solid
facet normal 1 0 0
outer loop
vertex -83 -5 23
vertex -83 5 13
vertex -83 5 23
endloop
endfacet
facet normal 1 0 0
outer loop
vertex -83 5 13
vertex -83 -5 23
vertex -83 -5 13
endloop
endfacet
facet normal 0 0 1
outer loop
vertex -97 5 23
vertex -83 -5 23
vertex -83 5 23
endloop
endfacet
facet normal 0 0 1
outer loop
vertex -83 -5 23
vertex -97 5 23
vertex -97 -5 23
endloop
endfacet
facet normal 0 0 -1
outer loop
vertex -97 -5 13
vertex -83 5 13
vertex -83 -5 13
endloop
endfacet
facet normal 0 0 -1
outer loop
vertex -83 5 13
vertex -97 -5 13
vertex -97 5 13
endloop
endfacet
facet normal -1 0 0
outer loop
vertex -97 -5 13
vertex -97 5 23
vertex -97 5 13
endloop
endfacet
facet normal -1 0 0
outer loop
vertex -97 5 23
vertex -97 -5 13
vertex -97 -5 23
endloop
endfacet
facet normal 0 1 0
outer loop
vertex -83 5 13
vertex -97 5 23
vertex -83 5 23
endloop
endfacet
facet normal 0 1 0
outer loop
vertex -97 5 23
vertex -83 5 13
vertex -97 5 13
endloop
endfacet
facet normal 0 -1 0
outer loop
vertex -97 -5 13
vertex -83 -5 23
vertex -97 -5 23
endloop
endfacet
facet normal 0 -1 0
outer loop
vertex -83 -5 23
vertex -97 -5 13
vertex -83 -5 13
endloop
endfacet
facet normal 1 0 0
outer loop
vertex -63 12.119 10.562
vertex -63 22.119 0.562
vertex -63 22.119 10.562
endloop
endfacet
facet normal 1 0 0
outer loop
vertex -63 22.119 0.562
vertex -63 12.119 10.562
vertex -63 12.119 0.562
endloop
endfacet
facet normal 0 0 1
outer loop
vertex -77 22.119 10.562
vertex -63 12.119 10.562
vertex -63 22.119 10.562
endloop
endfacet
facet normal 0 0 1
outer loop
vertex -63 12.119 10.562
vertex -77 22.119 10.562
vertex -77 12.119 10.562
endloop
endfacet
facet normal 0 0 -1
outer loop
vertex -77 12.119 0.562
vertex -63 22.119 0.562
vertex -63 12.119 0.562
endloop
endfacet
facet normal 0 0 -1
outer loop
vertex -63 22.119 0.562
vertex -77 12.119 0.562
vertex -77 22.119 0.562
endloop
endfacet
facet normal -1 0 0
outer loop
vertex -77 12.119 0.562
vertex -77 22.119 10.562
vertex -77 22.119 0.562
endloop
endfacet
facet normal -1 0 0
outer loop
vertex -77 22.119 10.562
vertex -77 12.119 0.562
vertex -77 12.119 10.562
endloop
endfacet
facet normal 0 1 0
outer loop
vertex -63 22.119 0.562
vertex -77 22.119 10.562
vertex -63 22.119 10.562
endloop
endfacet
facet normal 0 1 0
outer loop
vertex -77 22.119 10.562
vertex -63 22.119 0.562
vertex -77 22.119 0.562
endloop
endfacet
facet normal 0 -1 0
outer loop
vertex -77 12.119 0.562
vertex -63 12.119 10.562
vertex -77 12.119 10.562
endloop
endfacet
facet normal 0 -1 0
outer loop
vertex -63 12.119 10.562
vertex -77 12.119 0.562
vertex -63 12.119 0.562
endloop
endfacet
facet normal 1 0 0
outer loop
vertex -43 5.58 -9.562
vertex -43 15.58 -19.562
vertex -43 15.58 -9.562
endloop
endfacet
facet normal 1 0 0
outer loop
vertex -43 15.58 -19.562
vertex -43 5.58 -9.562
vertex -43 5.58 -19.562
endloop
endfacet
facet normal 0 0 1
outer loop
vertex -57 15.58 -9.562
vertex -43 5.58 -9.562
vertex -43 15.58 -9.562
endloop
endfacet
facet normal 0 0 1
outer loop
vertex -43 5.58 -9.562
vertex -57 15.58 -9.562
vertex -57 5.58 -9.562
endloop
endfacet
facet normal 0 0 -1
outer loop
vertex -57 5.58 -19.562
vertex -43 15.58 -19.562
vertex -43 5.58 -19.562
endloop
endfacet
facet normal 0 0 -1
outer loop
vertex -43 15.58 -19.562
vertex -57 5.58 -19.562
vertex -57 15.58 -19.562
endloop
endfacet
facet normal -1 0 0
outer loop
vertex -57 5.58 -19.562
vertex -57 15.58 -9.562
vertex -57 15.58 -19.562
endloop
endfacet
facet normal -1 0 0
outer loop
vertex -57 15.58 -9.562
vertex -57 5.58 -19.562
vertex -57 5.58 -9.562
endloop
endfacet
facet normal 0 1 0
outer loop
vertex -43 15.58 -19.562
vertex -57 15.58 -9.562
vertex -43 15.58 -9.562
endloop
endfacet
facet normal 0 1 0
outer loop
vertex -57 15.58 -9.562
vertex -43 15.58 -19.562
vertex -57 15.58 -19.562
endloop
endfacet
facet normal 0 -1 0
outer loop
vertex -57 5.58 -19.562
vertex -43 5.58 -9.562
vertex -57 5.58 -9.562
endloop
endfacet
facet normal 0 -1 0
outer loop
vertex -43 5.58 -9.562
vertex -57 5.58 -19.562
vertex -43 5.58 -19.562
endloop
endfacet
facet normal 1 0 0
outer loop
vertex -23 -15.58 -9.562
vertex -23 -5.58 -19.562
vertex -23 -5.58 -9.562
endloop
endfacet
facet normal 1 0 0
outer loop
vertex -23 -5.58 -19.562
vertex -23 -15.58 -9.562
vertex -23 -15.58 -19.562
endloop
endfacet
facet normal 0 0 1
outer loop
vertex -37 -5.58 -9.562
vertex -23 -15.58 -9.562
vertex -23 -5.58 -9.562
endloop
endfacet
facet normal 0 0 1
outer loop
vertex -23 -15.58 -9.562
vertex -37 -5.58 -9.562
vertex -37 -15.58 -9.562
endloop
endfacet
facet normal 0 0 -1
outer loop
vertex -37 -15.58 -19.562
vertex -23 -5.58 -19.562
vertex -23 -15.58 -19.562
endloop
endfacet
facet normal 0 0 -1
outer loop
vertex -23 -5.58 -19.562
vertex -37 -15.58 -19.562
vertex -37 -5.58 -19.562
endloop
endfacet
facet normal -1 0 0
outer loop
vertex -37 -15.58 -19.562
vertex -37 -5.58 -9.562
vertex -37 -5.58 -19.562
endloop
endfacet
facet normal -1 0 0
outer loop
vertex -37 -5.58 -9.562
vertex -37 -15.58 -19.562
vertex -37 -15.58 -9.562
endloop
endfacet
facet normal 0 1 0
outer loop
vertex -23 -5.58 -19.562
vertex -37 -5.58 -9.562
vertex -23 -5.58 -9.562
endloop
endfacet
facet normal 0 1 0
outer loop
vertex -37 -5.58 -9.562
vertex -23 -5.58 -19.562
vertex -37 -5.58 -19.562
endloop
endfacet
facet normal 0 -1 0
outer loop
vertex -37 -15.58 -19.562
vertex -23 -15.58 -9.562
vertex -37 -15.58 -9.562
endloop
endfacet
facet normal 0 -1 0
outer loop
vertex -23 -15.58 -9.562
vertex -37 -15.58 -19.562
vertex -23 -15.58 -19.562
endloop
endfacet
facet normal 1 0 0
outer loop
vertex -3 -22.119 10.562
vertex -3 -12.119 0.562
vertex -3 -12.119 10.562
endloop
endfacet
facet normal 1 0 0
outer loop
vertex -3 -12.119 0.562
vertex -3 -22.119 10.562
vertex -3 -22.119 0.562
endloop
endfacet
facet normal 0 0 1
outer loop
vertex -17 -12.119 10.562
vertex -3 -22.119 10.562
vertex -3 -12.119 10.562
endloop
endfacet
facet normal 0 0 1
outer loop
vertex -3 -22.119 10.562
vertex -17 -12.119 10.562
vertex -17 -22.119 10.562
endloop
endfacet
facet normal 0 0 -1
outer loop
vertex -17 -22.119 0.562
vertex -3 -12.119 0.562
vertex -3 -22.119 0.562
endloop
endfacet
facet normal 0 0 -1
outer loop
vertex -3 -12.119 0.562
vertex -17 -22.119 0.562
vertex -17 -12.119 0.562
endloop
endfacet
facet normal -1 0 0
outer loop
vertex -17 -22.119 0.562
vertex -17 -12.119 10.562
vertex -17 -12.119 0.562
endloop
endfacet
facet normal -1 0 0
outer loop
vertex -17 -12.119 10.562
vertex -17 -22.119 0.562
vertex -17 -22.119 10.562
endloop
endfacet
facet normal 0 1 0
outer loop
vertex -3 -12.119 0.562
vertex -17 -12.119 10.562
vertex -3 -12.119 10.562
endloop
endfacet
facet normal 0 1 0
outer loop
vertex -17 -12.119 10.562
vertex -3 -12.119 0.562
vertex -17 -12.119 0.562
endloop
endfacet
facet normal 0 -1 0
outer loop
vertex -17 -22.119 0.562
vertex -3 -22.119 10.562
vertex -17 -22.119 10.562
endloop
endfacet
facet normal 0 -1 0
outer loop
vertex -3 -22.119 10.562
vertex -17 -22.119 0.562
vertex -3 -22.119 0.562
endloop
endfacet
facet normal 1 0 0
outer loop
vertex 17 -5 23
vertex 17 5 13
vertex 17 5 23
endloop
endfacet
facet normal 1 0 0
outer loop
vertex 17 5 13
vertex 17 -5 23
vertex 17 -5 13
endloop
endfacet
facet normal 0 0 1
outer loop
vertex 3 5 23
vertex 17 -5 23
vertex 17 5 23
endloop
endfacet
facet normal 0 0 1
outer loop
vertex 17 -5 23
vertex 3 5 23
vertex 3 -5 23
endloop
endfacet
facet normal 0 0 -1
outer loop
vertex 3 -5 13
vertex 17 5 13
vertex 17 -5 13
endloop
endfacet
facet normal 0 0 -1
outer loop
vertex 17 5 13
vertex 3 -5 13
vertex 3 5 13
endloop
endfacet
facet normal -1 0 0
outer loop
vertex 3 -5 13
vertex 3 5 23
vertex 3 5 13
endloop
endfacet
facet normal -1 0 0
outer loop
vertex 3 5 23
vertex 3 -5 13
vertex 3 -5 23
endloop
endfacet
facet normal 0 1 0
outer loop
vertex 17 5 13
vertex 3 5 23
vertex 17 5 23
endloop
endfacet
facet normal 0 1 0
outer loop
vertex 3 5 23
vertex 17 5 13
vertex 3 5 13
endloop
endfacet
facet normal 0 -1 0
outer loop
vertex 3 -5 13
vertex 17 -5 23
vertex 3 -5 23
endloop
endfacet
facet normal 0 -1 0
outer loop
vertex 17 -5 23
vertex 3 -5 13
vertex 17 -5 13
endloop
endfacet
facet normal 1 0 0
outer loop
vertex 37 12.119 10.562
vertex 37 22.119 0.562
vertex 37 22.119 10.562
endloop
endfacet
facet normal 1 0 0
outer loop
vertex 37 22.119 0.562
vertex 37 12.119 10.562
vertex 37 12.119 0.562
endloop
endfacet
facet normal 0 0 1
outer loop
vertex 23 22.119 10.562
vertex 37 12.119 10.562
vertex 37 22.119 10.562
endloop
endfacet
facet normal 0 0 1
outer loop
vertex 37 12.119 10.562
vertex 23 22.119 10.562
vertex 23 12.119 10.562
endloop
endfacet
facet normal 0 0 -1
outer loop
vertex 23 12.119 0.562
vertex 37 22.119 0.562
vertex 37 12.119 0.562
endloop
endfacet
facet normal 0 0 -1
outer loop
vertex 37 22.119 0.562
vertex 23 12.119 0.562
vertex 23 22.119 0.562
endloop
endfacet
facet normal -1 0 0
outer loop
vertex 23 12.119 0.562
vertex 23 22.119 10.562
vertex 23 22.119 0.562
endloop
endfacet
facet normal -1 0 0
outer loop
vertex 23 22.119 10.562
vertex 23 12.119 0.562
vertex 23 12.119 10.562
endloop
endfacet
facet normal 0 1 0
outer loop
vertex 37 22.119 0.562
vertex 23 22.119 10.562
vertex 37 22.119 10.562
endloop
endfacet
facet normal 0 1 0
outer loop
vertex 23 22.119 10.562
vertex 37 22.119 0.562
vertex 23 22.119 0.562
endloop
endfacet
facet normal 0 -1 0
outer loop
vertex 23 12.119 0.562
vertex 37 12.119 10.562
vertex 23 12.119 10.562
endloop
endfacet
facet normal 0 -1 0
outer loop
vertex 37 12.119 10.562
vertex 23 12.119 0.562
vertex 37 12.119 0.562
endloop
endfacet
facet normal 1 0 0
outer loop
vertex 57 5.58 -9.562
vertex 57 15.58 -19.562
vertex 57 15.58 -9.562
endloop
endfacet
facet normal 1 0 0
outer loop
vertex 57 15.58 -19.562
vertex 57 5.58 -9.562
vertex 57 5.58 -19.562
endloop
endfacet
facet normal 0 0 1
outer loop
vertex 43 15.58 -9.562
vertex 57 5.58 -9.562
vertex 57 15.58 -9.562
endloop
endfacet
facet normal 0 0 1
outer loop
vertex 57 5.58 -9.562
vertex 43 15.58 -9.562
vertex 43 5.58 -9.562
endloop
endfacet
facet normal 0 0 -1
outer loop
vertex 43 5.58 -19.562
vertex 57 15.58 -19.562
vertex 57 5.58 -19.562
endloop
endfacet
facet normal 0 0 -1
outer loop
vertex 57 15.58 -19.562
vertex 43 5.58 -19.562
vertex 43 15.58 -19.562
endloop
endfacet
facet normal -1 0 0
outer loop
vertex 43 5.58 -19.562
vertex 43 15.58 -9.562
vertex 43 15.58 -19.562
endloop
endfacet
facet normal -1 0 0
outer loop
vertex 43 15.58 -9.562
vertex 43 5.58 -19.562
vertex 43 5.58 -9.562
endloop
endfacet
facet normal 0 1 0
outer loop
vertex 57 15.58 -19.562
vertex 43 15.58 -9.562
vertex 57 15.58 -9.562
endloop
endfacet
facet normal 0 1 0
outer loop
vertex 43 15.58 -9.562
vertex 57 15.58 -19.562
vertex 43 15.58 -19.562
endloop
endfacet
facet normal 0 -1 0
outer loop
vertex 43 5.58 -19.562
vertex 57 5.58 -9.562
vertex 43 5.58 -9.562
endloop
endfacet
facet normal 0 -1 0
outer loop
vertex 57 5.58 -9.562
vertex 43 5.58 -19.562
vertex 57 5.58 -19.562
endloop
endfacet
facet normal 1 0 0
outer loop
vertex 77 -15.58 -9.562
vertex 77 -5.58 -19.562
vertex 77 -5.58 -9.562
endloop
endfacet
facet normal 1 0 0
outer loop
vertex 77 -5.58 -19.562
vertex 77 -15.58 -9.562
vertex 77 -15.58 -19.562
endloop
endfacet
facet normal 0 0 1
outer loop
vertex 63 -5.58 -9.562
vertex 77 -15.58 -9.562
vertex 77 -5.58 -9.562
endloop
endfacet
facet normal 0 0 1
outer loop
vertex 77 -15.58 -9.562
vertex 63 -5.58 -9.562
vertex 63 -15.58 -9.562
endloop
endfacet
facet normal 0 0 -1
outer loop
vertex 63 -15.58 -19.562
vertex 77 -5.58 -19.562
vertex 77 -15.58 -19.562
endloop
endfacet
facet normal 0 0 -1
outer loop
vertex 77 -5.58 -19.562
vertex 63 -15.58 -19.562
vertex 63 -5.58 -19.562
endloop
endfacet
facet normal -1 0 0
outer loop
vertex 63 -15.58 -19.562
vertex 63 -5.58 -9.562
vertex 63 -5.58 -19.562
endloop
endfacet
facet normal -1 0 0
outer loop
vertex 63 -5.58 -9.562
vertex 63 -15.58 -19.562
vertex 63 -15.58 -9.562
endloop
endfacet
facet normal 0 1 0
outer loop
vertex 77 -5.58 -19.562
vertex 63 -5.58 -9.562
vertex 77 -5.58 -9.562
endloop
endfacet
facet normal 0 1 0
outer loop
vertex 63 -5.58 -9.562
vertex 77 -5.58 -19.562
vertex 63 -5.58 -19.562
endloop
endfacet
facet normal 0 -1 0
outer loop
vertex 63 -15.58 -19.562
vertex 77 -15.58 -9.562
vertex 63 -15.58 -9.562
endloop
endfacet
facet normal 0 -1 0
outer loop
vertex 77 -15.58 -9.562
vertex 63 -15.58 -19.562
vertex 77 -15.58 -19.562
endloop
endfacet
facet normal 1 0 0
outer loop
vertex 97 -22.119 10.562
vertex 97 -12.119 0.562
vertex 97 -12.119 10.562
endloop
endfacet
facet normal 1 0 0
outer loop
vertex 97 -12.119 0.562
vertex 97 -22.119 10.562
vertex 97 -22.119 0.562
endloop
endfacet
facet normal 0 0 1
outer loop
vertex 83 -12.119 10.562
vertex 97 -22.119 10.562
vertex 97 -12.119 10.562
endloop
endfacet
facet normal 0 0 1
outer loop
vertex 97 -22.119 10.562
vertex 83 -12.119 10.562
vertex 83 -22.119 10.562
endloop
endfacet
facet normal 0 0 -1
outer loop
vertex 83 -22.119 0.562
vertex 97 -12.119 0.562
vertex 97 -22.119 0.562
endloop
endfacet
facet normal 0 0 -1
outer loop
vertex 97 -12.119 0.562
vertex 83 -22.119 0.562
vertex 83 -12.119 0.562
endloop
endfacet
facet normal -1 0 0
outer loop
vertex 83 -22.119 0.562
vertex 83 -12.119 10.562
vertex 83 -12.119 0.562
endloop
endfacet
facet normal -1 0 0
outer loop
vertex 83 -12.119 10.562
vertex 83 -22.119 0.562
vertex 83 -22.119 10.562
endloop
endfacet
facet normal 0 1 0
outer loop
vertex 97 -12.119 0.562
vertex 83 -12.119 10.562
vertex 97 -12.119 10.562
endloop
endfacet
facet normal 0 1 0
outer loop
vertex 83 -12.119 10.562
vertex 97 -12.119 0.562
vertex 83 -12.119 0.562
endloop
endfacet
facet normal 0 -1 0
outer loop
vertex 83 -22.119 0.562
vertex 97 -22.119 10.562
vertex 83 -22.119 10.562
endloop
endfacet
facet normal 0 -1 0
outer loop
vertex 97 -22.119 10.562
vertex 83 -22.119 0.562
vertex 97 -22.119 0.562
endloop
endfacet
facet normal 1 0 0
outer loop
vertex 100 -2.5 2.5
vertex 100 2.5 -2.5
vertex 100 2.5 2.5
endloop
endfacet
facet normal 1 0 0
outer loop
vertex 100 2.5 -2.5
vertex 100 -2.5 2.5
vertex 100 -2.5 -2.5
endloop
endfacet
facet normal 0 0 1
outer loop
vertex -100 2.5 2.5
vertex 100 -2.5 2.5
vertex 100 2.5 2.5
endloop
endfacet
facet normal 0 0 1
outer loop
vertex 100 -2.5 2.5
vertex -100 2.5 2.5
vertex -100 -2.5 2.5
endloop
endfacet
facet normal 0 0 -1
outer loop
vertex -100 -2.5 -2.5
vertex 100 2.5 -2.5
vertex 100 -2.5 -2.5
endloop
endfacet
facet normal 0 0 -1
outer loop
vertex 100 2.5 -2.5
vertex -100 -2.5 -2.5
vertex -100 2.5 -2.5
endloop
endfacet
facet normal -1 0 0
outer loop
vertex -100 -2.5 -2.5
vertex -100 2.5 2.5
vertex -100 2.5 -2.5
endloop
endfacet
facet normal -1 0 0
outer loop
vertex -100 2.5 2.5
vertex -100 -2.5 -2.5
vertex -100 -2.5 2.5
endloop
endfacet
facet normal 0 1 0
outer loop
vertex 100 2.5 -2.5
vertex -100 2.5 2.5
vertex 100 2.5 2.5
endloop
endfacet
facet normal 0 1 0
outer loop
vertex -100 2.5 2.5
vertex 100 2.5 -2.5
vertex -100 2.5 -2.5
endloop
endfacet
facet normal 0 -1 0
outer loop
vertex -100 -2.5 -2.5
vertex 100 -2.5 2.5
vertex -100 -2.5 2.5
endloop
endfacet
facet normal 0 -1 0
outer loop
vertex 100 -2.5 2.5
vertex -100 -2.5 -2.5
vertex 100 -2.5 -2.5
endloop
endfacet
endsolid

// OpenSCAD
// A deliberately long model for the depth map, staggered so that depth is
// actually visible end-on.
//
// The viewport and export normalize depth across the bounding box's extent along
// the current view axis, which is orientation dependent: this model's extent is
// 200 seen end-on and ~50 seen side-on, so the same geometry grades over a very
// different range in the two views. Reported from dogfooding on "extruder
// illustration", which has this shape - measured there as a 3.3x swing in mean
// brightness across three views.
//
// The rungs are offset laterally on purpose. An earlier version of this file put
// everything on the axis, and end-on the nearest element simply occluded all the
// rest - a view that looks alarming (one bright blob, everything else black) but
// says nothing about depth encoding, because there was no farther surface left
// visible to encode.
for (i = [0:9]) {
  translate([i * 20 - 90, sin(i * 72) * 18, cos(i * 72) * 18])
    cube([14, 10, 10], center = true);
}
cube([200, 5, 5], center = true);
